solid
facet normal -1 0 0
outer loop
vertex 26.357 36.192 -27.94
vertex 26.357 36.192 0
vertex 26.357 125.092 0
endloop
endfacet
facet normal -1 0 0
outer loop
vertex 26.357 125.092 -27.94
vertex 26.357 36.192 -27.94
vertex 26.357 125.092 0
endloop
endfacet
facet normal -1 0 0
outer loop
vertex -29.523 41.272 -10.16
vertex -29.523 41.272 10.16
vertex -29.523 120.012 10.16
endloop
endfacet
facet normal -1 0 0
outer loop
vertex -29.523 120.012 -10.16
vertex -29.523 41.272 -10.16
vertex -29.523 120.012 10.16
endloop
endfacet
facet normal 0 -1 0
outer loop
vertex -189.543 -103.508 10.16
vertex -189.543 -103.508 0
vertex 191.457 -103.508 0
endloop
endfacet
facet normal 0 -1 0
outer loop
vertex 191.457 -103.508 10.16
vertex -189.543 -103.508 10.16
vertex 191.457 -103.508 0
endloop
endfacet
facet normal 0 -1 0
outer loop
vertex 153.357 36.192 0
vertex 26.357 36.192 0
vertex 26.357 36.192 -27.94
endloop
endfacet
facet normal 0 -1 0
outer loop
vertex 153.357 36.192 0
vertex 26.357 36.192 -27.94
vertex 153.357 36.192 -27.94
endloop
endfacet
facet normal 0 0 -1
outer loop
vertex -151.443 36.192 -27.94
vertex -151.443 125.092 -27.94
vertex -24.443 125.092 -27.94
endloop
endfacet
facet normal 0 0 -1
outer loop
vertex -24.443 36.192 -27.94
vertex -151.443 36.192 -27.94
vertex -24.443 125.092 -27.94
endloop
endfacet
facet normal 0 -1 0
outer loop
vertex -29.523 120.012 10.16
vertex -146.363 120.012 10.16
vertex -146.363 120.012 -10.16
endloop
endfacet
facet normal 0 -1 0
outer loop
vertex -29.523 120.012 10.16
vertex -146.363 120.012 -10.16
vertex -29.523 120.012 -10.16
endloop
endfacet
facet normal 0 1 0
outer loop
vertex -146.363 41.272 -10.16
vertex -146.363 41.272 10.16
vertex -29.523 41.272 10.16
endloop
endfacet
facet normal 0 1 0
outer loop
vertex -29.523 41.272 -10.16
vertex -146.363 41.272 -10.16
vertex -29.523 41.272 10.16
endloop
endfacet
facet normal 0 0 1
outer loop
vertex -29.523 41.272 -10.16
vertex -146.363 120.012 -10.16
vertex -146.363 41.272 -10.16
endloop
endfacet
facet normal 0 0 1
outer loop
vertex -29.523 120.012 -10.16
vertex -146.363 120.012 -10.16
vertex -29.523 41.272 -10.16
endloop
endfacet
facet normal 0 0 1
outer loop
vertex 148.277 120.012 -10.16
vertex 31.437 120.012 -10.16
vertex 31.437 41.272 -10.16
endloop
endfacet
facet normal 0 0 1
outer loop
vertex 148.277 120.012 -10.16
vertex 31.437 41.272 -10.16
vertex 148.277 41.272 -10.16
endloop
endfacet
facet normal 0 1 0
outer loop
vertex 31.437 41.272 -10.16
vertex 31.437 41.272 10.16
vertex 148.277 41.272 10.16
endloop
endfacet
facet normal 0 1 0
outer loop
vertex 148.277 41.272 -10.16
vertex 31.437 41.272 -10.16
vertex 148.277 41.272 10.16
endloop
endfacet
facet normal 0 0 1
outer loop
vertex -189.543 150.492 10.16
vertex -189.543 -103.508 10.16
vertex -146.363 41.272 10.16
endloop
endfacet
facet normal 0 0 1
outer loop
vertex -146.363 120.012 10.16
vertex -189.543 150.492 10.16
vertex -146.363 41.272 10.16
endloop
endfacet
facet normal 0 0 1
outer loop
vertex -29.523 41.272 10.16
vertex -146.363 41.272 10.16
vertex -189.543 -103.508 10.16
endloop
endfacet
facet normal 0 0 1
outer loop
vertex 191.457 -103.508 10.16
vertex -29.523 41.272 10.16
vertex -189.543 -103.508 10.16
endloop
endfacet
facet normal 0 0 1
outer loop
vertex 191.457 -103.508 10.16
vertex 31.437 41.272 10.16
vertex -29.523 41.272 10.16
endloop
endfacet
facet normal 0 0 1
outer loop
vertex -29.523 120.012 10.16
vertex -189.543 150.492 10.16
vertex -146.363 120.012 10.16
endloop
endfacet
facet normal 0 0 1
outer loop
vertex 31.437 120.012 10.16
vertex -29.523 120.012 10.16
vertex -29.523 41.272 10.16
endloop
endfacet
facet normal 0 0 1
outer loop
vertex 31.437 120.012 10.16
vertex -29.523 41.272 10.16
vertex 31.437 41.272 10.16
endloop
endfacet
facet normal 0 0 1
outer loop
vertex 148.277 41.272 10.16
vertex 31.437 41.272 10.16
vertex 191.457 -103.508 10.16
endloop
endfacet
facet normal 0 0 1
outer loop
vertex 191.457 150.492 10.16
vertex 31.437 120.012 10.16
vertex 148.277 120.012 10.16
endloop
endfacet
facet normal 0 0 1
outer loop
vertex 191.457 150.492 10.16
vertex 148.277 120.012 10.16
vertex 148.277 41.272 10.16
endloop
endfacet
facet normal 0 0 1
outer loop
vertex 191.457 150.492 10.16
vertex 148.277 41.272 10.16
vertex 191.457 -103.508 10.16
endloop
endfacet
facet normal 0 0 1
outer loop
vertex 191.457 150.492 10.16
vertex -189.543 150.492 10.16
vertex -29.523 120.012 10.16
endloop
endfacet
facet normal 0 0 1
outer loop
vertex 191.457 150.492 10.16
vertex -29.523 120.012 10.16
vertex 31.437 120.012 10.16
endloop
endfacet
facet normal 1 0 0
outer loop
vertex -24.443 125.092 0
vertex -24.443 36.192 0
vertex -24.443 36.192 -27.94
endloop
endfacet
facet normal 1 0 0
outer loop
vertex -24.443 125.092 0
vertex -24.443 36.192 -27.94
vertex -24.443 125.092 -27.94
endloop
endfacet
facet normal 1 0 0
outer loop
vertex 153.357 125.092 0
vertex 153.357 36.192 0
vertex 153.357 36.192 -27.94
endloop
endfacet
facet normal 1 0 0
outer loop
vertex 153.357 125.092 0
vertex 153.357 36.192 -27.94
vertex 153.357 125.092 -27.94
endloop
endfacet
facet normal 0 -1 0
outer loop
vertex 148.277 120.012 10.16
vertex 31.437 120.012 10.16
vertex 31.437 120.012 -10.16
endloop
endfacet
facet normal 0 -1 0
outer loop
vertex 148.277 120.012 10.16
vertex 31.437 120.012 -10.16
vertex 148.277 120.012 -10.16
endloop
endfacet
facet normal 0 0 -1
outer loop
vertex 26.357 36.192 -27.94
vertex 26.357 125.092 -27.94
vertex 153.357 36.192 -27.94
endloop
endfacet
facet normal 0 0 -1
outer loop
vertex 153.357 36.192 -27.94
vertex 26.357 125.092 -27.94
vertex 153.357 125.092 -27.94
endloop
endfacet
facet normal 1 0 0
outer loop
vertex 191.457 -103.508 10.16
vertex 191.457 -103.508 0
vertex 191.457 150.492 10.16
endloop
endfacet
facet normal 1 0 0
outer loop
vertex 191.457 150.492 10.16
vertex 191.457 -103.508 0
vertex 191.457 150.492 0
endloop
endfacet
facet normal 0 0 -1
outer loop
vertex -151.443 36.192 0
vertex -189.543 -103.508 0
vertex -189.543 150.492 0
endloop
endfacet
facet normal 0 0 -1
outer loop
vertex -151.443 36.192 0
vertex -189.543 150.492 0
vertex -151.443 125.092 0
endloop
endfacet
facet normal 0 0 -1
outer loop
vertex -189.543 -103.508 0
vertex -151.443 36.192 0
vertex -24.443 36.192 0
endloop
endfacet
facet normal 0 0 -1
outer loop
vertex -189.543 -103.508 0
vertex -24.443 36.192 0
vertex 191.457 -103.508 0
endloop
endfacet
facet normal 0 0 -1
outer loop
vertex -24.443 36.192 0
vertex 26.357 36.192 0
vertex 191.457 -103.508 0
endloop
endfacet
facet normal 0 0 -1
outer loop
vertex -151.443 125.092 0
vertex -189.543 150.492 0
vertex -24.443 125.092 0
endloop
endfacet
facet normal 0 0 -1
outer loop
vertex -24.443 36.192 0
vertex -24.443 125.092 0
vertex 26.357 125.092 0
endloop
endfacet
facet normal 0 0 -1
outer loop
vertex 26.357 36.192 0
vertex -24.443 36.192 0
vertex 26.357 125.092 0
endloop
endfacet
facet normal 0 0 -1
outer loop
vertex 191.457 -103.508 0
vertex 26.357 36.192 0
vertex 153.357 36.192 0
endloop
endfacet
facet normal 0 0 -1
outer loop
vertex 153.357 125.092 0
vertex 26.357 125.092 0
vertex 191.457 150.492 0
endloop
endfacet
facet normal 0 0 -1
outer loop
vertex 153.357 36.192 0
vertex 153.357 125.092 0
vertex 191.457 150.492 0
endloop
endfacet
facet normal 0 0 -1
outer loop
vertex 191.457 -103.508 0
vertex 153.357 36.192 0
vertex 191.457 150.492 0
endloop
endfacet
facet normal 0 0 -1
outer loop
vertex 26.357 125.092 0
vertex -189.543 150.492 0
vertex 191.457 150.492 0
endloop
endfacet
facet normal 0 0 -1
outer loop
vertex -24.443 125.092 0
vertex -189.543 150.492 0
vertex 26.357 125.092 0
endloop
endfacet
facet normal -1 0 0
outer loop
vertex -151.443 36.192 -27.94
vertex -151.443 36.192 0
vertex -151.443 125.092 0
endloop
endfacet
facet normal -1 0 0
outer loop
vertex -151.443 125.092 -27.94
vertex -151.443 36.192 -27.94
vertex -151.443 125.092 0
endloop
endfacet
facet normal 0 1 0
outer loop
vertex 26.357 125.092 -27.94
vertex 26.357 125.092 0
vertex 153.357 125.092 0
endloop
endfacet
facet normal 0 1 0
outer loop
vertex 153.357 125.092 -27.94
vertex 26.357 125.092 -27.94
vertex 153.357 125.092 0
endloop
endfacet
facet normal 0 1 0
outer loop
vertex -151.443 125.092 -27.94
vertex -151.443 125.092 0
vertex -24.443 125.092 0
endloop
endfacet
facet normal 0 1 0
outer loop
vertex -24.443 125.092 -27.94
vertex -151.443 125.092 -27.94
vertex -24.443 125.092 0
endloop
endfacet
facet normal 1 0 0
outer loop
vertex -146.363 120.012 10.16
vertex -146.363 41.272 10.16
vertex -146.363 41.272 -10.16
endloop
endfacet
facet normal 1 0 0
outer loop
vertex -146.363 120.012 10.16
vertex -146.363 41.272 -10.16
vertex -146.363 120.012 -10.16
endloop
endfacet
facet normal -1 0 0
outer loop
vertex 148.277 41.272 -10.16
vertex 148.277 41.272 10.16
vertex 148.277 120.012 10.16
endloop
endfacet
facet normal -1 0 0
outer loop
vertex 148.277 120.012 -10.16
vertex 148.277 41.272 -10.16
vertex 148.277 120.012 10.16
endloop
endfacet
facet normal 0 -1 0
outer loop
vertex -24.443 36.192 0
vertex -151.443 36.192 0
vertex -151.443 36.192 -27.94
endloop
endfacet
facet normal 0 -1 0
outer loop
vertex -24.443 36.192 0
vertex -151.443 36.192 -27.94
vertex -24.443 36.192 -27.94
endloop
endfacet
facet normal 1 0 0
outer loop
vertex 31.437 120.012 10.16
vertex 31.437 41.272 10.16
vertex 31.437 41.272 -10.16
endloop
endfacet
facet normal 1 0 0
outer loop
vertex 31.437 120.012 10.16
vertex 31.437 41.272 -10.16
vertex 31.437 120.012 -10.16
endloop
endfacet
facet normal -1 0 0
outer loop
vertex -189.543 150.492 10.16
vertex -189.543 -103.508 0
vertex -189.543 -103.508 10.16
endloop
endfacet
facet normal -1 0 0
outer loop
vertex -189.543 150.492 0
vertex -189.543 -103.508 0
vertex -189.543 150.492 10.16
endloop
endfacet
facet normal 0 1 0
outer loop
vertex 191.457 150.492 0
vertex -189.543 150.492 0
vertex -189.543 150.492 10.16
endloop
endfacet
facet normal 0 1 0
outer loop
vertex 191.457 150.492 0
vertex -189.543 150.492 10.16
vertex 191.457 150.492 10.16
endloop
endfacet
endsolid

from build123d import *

# Parameters (mm, degrees)
F0_W     = 381
F0_H     = 254
F0_W_2   = 127
F0_H_2   = 88.9
F1_DEPTH = 10.16
F2_W     = 127
F2_H     = 88.9
F3_DEPTH = 38.1
F4_W     = 116.84
F4_H     = 78.74
F5_DEPTH = 20.32


with BuildPart() as f1:
    # F0 (on Top) → F1 (new body)
    with BuildSketch(Plane.XY):
        with Locations((0.95677, 23.492131)):
            Rectangle(F0_W, F0_H)
        with Locations((-87.94323, -44.45)):
            Rectangle(F0_W_2, F0_H_2, mode=Mode.SUBTRACT)
        with Locations((89.85677, -44.593953)):
            Rectangle(F0_W_2, F0_H_2, mode=Mode.SUBTRACT)
        with Locations((-87.94323, -44.45)):
            Rectangle(F0_W_2, F0_H_2)
        with Locations((89.85677, -44.593953)):
            Rectangle(F0_W_2, F0_H_2)
    extrude(amount=F1_DEPTH)

    # F2 (on face) → F3 (join)
    with BuildSketch(Plane.XY.offset(10.16)):
        with Locations((-87.94323, 80.642131)):
            Rectangle(F2_W, F2_H)
        with Locations((89.85677, 80.642131)):
            Rectangle(F2_W, F2_H)
    extrude(amount=-F3_DEPTH)

    # F4 (on face) → F5 (cut)
    with BuildSketch(Plane.XY.offset(10.16)):
        with Locations((-87.94323, 80.642131)):
            Rectangle(F4_W, F4_H)
        with Locations((89.85677, 80.642131)):
            Rectangle(F4_W, F4_H)
    extrude(amount=-F5_DEPTH, mode=Mode.SUBTRACT)


solid = f1.part
